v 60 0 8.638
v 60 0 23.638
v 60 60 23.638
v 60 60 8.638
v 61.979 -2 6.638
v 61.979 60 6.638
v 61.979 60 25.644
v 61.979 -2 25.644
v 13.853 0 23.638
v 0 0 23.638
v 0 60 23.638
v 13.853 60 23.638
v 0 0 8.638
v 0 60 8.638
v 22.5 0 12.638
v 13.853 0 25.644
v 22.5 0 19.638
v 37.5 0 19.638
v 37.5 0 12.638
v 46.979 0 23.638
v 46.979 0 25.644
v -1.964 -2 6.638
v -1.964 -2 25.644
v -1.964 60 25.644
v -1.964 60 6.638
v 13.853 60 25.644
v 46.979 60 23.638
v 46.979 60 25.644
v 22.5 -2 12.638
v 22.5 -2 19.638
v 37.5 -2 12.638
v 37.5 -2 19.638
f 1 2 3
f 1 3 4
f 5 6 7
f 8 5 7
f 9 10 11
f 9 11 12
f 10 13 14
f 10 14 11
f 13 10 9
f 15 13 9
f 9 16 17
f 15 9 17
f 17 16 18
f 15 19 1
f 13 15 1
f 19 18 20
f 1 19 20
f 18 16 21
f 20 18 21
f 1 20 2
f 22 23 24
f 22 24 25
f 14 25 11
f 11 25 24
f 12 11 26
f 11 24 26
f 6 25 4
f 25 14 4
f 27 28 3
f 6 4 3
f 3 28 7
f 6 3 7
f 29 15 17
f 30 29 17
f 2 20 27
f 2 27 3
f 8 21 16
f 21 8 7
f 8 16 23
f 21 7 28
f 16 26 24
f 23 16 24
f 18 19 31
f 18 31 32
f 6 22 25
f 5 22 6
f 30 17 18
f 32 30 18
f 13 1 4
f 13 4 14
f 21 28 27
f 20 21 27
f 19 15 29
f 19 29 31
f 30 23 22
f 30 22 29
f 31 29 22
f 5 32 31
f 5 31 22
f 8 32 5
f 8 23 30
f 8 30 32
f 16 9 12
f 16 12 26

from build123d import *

# Parameters (mm, degrees)
F0_W     = 15
F0_H     = 7
F1_DEPTH = 2
F2_DEPTH = 60


with BuildPart() as f1:
    # F0 (on Front) → F1 (new body)
    with BuildSketch(Plane.XZ):
        Polygon((0, 23.638431), (0, 8.638419), (60, 8.638419), (60, 23.638419), (46.979439, 23.638419), (46.979439, 25.643766), (13.85323, 25.643766), (13.85323, 23.638431), align=None)
        with Locations((30, 16.138419)):
            Rectangle(F0_W, F0_H, mode=Mode.SUBTRACT)
        Polygon((60, 8.638419), (0, 8.638419), (0, 23.638431), (13.85323, 23.638431), (13.85323, 25.643766), (-1.963923, 25.643766), (-1.963923, 6.638419), (61.979439, 6.638419), (61.979439, 25.643766), (46.979439, 25.643766), (46.979439, 23.638419), (60, 23.638419), align=None)
    extrude(amount=F1_DEPTH)

    # F0 (on Front) → F2 (join)
    with BuildSketch(Plane.XZ):
        Polygon((60, 8.638419), (0, 8.638419), (0, 23.638431), (13.85323, 23.638431), (13.85323, 25.643766), (-1.963923, 25.643766), (-1.963923, 6.638419), (61.979439, 6.638419), (61.979439, 25.643766), (46.979439, 25.643766), (46.979439, 23.638419), (60, 23.638419), align=None)
    extrude(amount=-F2_DEPTH)


solid = f1.part
